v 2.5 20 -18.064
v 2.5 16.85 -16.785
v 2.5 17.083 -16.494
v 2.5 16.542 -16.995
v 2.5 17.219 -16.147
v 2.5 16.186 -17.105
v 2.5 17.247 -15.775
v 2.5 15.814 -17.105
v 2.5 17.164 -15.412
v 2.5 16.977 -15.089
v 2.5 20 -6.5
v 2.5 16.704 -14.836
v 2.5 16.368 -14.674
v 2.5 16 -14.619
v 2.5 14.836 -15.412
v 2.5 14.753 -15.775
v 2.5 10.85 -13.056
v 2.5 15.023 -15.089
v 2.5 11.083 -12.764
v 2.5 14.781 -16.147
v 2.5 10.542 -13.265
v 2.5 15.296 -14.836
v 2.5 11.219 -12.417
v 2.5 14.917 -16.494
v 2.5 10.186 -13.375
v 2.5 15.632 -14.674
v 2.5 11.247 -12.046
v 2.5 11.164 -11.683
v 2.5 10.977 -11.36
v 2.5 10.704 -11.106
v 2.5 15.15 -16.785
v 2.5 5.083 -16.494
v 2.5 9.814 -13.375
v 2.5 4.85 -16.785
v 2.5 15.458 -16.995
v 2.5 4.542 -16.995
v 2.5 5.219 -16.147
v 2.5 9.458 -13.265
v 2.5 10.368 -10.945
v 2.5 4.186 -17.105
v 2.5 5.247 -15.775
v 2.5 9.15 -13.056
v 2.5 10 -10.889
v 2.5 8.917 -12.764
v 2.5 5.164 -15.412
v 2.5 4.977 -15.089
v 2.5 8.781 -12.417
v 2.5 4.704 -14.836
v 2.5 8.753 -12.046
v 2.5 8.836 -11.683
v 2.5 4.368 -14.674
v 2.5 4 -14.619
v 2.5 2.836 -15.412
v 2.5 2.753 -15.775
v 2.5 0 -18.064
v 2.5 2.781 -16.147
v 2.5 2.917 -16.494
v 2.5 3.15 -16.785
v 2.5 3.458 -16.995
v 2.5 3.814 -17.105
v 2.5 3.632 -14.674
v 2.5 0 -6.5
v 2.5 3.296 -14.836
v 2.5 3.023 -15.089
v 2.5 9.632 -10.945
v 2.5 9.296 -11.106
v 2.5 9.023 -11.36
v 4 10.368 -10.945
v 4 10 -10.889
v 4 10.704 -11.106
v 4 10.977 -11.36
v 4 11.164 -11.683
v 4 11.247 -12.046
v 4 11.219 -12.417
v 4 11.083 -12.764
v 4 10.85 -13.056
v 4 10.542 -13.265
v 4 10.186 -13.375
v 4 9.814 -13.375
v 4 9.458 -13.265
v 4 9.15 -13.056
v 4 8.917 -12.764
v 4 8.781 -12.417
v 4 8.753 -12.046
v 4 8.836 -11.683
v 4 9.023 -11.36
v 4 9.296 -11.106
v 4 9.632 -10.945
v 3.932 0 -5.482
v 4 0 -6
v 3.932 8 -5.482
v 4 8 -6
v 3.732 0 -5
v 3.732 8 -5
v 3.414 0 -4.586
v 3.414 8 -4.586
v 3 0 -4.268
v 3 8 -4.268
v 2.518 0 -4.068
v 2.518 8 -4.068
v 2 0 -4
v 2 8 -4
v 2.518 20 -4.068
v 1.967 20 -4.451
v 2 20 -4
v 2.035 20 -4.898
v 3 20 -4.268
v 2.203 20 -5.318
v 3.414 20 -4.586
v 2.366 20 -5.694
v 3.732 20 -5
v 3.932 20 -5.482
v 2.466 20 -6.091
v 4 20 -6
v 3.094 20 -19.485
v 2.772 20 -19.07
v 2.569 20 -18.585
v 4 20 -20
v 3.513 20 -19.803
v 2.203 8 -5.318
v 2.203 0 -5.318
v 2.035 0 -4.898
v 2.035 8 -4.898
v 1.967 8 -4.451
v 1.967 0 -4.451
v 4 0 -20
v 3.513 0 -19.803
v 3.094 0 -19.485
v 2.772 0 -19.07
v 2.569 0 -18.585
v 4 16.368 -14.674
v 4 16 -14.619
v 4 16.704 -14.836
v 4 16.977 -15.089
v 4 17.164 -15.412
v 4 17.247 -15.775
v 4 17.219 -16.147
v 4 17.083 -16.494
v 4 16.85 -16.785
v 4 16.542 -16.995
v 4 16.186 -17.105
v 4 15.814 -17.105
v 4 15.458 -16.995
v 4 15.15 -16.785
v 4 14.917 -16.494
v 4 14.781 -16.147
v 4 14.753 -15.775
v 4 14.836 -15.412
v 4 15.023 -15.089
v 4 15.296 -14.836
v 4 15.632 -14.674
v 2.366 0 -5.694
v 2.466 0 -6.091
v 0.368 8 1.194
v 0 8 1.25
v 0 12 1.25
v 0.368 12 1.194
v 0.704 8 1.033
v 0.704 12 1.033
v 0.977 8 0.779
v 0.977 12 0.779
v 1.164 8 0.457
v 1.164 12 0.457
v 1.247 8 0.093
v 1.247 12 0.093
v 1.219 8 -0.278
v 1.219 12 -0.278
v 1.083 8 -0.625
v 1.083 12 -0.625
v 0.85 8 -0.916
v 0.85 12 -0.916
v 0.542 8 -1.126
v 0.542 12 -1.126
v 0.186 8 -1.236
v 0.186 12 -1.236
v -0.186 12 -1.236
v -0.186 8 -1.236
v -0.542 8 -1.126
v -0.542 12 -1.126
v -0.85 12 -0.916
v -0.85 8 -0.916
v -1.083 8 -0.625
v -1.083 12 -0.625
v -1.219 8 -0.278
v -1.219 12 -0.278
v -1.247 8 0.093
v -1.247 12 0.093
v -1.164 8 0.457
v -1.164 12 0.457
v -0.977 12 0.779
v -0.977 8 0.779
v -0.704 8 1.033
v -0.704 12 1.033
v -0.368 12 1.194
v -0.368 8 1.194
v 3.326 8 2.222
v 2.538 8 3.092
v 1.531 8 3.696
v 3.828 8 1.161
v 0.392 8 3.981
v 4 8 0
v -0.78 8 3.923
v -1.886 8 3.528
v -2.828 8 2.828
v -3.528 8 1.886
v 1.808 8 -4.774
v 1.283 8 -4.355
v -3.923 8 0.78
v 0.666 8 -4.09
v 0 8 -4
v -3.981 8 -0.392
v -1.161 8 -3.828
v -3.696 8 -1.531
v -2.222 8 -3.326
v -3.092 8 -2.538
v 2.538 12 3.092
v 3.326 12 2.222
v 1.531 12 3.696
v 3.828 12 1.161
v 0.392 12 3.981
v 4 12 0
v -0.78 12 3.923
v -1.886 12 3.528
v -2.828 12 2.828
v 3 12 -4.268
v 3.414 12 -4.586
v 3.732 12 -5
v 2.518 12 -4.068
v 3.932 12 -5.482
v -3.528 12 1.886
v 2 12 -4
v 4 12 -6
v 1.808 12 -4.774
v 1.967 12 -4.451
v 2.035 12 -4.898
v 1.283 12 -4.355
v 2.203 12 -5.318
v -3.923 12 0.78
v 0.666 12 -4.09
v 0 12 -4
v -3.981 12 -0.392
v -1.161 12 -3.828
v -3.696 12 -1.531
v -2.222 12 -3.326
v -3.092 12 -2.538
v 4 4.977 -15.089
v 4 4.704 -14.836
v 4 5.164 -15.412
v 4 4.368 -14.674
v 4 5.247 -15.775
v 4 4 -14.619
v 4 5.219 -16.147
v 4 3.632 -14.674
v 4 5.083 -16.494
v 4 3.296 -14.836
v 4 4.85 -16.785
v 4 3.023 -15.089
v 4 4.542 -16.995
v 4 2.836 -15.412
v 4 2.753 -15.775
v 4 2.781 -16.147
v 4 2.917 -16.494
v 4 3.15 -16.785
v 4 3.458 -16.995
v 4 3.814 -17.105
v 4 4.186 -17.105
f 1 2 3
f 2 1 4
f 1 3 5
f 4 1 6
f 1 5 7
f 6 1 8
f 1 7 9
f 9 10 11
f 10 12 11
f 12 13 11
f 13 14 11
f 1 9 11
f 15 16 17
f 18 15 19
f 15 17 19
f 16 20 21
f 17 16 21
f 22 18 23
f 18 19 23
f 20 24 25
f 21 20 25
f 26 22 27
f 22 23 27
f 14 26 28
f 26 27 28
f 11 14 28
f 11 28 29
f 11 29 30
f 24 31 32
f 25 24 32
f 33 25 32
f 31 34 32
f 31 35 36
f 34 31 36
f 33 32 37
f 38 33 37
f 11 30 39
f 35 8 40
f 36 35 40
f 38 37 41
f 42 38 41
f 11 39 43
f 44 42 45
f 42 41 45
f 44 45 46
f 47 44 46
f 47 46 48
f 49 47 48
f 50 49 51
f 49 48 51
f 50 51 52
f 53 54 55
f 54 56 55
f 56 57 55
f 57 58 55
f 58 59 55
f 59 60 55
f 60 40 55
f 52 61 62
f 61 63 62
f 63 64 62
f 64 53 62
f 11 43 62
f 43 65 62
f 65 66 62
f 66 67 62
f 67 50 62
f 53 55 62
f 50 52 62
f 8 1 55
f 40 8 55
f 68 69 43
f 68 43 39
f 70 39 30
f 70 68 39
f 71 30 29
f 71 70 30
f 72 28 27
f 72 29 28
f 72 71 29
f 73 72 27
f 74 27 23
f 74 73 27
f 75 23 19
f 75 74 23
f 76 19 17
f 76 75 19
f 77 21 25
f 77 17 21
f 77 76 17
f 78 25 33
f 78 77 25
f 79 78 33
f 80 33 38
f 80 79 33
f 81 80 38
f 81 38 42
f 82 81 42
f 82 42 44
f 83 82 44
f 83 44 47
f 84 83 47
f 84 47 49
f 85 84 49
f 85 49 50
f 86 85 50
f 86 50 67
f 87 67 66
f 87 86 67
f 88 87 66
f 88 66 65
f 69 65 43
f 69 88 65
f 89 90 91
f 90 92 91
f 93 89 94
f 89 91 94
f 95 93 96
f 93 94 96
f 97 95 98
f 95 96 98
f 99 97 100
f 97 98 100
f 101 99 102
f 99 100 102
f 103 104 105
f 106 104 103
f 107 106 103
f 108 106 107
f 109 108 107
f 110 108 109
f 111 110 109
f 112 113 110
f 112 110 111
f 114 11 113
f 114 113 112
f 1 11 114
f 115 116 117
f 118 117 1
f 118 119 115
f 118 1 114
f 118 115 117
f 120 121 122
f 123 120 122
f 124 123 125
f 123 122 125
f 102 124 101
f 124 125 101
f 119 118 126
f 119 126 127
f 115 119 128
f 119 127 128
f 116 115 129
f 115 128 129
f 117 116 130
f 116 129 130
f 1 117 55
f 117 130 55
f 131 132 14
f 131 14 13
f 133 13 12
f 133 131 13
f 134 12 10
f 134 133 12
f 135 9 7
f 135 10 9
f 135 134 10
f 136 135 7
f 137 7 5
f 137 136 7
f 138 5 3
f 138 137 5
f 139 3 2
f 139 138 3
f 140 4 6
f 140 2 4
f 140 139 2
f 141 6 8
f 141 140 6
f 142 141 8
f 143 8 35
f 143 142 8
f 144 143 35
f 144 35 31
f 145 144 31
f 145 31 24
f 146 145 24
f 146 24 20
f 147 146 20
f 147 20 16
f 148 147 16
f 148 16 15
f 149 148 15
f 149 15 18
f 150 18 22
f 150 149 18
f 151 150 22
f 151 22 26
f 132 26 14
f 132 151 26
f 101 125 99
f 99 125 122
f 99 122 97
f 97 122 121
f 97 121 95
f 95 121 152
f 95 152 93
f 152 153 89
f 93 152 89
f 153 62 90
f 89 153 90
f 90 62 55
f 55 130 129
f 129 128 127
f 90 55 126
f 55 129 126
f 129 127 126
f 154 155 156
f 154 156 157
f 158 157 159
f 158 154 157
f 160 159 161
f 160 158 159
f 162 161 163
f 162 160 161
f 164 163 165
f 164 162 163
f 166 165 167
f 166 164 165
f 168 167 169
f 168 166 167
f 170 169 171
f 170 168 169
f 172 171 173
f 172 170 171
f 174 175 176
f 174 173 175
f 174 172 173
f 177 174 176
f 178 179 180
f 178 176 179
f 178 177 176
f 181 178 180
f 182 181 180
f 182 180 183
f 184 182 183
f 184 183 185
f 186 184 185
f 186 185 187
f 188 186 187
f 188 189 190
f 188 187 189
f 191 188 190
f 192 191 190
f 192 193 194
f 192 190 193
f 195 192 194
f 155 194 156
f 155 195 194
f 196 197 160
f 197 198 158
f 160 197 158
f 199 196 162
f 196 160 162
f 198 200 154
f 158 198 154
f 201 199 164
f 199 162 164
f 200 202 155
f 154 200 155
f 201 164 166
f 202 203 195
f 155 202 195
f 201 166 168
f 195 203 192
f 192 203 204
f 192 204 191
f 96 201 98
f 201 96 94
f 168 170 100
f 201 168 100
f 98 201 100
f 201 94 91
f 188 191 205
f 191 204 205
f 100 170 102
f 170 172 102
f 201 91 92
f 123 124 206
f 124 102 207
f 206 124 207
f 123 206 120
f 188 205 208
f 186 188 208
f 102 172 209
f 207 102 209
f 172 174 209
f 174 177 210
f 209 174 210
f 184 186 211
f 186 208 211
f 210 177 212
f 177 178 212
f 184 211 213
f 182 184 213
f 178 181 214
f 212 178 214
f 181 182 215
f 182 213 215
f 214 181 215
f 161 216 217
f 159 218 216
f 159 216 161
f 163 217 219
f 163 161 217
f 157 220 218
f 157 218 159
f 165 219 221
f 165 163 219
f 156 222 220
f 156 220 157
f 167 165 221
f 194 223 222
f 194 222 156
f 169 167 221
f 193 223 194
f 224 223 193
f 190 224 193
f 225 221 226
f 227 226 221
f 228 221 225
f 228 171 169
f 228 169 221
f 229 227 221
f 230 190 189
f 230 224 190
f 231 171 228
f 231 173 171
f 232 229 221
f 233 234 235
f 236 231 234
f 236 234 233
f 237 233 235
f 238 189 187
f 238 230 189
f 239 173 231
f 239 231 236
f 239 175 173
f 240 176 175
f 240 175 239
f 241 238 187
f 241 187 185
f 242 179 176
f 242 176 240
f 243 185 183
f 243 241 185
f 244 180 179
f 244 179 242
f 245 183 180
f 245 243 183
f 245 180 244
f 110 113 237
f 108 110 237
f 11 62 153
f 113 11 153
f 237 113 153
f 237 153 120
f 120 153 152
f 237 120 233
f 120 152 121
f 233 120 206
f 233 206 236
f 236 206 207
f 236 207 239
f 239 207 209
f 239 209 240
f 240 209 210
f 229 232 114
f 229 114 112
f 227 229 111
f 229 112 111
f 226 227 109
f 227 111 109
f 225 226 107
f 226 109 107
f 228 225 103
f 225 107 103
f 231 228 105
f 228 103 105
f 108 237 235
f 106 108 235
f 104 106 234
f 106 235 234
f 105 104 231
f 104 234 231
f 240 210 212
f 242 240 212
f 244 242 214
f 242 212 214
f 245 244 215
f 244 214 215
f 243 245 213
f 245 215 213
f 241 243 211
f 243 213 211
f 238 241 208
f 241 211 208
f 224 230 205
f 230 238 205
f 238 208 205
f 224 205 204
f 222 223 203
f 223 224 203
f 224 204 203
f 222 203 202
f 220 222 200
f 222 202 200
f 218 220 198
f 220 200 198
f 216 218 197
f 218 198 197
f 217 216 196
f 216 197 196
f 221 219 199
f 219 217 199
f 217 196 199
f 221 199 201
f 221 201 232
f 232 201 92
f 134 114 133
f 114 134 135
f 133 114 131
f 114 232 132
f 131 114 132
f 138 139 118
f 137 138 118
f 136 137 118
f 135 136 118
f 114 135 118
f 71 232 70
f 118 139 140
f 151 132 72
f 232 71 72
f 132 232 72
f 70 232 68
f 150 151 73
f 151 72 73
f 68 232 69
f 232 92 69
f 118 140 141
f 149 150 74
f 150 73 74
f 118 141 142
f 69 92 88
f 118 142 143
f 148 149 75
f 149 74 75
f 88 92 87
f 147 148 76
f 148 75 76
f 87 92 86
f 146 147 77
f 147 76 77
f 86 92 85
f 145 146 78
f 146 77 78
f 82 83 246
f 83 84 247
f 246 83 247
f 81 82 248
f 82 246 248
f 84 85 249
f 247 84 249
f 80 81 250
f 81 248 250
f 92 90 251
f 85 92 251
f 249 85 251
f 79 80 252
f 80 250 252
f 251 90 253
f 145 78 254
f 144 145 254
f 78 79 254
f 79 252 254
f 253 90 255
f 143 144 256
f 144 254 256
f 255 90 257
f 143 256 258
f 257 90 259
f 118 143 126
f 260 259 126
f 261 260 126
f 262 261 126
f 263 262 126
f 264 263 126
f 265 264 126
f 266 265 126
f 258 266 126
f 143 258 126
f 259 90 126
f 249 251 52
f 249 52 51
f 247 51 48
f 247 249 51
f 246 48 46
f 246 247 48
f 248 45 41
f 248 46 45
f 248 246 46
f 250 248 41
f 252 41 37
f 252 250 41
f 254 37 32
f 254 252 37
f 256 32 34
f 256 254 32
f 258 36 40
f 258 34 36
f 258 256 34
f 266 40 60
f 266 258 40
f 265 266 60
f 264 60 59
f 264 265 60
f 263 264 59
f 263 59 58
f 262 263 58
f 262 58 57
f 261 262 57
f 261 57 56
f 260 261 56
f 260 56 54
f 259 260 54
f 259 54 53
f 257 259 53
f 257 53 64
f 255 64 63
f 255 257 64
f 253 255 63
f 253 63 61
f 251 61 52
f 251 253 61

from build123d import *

# Parameters (mm, degrees)
SKETCH1_R               = 1.25
BOSS_EXTRUDE1_DEPTH     = 20
CUT_EXTRUDE1_DEPTH      = 30.021543722
CUT_EXTRUDE1_DEPTH_BACK = 30.021543722
SKETCH2_R               = 1.25
CUT_EXTRUDE3_DEPTH      = 29.565713714
CUT_EXTRUDE3_DEPTH_BACK = 29.565713714
SKETCH3_W               = 10
SKETCH3_H               = 8
SKETCH3_W_2             = 9.357078711
FILLET3_R               = 2
FILLET4_R               = 2
FILLET8_R               = 2
FILLET9_R               = 2
FILLET11_R              = 2


with BuildPart() as part:
    # Sketch1 → Boss-Extrude1 (new body)
    with BuildSketch(Plane(origin=(0, 0, 0), x_dir=(1, 0, 0), z_dir=(0, 1, 0))):
        with BuildLine():
            Line((4, 0), (4, 20))
            Line((4, 20), (2.5, 20))
            Line((2.5, 20), (2.5, 15.120027663))
            Line((2.5, 15.120027663), (2.5, 6.5))
            ThreePointArc((2.5, 6.5), (1.767766953, 4.732233047), (0, 4))
            ThreePointArc((0, 4), (-2.828427125, -2.828427125), (4, 0))
        make_face()
        with Locations(Location((0, 0, 0), (0, 0, 270))):
            Circle(SKETCH1_R, mode=Mode.SUBTRACT)
    extrude(amount=BOSS_EXTRUDE1_DEPTH)

    # Sketch2 → Cut-Extrude1 (cut, two sides: drawn at the far end of the back side and taken through both)
    with BuildSketch(Plane.ZY.offset(-2.5).offset(-CUT_EXTRUDE1_DEPTH_BACK)):
        with Locations((-12.139236455, 10)):
            Circle(SKETCH2_R)
        with Locations((-15.86873762, 4)):
            Circle(SKETCH2_R)
        with Locations((-15.86873762, 16)):
            Circle(SKETCH2_R)
    extrude(amount=CUT_EXTRUDE1_DEPTH + CUT_EXTRUDE1_DEPTH_BACK, mode=Mode.SUBTRACT)

    # Sketch3 → Cut-Extrude3 (cut, two sides: drawn at the far end of the back side and taken through both)
    with BuildSketch(Plane(origin=(0, 0, 0), x_dir=(0, 0, -1), z_dir=(1, 0, 0)).offset(-CUT_EXTRUDE3_DEPTH_BACK)):
        with Locations((-1, 4)):
            Rectangle(SKETCH3_W, SKETCH3_H)
        with Locations((-0.678539356, 16)):
            Rectangle(SKETCH3_W_2, SKETCH3_H)
    extrude(amount=CUT_EXTRUDE3_DEPTH + CUT_EXTRUDE3_DEPTH_BACK, mode=Mode.SUBTRACT)

    # Fillet3
    fillet3_edges = [part.edges().sort_by_distance(p)[0] for p in [
        (4, 16, -4),
    ]]
    fillet(fillet3_edges, radius=FILLET3_R)

    # Fillet4
    # the kernel refuses this fillet: 2 mm, written as the material it takes off along each edge
    with BuildSketch(Plane(origin=(0, 12, -4), x_dir=(0.8581589387978472, 0, -0.513384101586086), z_dir=(0, 1, 0))) as fillet4_piece_1:
        with BuildLine():
            CenterArc((3.593688711, -1.716317878), FILLET4_R, 120.889507128, 38.942441269)
            Line((1.716317878, -1.026768203), (0, 0))
            ThreePointArc((0, 0), (1.283460254, -0.354602653), (2.566920508, 0))
        make_face()
    extrude(amount=14.41730127, mode=Mode.SUBTRACT)

    # Fillet8
    fillet8_edges = [part.edges().sort_by_distance(p)[0] for p in [
        (4, 4, -4),
    ]]
    fillet(fillet8_edges, radius=FILLET8_R)

    # Fillet9
    # the kernel refuses this fillet: 2 mm, written as the material it takes off along each edge
    with BuildSketch(Plane(origin=(0, -6.41730127, -4), x_dir=(0.8581589387978472, 0, -0.513384101586086), z_dir=(0, 1, 0))) as fillet9_piece_1:
        with BuildLine():
            CenterArc((3.593688711, -1.716317878), FILLET9_R, 120.889507128, 38.942441269)
            Line((1.716317878, -1.026768203), (1.678770461, -1.01297721))
            ThreePointArc((1.678770461, -1.01297721), (0.837623575, -0.547710459), (-0.020535364, -0.034326358))
            Line((-0.020535364, -0.034326358), (0.020535364, 0.034326358))
            ThreePointArc((0.020535364, 0.034326358), (1.283460254, -0.314602653), (2.546385144, 0.034326358))
            Line((2.546385144, 0.034326358), (2.566920508, 0))
        make_face()
    extrude(amount=14.41730127, mode=Mode.SUBTRACT)

    # Fillet11
    # the kernel refuses this fillet: 2 mm, written as the material it takes off along each edge
    with BuildSketch(Plane(origin=(2.5, -4.841229183, -20), x_dir=(1, 0, 0), z_dir=(0, 1, 0))) as fillet11_piece_1:
        with BuildLine():
            CenterArc((2, -1.936491673), FILLET11_R, 104.477512186, 75.522487814)
            Line((0, -1.936491673), (-0.04, -1.936491673))
            Line((-0.04, -1.936491673), (-0.04, 0))
            Line((-0.04, 0), (0, 0.04))
            ThreePointArc((0, 0.04), (0.75, 0.04), (1.49, 0.038729833))
            Line((1.49, 0.038729833), (1.5, 0))
        make_face()
    extrude(amount=29.682458366, mode=Mode.SUBTRACT)


solid = part.part
